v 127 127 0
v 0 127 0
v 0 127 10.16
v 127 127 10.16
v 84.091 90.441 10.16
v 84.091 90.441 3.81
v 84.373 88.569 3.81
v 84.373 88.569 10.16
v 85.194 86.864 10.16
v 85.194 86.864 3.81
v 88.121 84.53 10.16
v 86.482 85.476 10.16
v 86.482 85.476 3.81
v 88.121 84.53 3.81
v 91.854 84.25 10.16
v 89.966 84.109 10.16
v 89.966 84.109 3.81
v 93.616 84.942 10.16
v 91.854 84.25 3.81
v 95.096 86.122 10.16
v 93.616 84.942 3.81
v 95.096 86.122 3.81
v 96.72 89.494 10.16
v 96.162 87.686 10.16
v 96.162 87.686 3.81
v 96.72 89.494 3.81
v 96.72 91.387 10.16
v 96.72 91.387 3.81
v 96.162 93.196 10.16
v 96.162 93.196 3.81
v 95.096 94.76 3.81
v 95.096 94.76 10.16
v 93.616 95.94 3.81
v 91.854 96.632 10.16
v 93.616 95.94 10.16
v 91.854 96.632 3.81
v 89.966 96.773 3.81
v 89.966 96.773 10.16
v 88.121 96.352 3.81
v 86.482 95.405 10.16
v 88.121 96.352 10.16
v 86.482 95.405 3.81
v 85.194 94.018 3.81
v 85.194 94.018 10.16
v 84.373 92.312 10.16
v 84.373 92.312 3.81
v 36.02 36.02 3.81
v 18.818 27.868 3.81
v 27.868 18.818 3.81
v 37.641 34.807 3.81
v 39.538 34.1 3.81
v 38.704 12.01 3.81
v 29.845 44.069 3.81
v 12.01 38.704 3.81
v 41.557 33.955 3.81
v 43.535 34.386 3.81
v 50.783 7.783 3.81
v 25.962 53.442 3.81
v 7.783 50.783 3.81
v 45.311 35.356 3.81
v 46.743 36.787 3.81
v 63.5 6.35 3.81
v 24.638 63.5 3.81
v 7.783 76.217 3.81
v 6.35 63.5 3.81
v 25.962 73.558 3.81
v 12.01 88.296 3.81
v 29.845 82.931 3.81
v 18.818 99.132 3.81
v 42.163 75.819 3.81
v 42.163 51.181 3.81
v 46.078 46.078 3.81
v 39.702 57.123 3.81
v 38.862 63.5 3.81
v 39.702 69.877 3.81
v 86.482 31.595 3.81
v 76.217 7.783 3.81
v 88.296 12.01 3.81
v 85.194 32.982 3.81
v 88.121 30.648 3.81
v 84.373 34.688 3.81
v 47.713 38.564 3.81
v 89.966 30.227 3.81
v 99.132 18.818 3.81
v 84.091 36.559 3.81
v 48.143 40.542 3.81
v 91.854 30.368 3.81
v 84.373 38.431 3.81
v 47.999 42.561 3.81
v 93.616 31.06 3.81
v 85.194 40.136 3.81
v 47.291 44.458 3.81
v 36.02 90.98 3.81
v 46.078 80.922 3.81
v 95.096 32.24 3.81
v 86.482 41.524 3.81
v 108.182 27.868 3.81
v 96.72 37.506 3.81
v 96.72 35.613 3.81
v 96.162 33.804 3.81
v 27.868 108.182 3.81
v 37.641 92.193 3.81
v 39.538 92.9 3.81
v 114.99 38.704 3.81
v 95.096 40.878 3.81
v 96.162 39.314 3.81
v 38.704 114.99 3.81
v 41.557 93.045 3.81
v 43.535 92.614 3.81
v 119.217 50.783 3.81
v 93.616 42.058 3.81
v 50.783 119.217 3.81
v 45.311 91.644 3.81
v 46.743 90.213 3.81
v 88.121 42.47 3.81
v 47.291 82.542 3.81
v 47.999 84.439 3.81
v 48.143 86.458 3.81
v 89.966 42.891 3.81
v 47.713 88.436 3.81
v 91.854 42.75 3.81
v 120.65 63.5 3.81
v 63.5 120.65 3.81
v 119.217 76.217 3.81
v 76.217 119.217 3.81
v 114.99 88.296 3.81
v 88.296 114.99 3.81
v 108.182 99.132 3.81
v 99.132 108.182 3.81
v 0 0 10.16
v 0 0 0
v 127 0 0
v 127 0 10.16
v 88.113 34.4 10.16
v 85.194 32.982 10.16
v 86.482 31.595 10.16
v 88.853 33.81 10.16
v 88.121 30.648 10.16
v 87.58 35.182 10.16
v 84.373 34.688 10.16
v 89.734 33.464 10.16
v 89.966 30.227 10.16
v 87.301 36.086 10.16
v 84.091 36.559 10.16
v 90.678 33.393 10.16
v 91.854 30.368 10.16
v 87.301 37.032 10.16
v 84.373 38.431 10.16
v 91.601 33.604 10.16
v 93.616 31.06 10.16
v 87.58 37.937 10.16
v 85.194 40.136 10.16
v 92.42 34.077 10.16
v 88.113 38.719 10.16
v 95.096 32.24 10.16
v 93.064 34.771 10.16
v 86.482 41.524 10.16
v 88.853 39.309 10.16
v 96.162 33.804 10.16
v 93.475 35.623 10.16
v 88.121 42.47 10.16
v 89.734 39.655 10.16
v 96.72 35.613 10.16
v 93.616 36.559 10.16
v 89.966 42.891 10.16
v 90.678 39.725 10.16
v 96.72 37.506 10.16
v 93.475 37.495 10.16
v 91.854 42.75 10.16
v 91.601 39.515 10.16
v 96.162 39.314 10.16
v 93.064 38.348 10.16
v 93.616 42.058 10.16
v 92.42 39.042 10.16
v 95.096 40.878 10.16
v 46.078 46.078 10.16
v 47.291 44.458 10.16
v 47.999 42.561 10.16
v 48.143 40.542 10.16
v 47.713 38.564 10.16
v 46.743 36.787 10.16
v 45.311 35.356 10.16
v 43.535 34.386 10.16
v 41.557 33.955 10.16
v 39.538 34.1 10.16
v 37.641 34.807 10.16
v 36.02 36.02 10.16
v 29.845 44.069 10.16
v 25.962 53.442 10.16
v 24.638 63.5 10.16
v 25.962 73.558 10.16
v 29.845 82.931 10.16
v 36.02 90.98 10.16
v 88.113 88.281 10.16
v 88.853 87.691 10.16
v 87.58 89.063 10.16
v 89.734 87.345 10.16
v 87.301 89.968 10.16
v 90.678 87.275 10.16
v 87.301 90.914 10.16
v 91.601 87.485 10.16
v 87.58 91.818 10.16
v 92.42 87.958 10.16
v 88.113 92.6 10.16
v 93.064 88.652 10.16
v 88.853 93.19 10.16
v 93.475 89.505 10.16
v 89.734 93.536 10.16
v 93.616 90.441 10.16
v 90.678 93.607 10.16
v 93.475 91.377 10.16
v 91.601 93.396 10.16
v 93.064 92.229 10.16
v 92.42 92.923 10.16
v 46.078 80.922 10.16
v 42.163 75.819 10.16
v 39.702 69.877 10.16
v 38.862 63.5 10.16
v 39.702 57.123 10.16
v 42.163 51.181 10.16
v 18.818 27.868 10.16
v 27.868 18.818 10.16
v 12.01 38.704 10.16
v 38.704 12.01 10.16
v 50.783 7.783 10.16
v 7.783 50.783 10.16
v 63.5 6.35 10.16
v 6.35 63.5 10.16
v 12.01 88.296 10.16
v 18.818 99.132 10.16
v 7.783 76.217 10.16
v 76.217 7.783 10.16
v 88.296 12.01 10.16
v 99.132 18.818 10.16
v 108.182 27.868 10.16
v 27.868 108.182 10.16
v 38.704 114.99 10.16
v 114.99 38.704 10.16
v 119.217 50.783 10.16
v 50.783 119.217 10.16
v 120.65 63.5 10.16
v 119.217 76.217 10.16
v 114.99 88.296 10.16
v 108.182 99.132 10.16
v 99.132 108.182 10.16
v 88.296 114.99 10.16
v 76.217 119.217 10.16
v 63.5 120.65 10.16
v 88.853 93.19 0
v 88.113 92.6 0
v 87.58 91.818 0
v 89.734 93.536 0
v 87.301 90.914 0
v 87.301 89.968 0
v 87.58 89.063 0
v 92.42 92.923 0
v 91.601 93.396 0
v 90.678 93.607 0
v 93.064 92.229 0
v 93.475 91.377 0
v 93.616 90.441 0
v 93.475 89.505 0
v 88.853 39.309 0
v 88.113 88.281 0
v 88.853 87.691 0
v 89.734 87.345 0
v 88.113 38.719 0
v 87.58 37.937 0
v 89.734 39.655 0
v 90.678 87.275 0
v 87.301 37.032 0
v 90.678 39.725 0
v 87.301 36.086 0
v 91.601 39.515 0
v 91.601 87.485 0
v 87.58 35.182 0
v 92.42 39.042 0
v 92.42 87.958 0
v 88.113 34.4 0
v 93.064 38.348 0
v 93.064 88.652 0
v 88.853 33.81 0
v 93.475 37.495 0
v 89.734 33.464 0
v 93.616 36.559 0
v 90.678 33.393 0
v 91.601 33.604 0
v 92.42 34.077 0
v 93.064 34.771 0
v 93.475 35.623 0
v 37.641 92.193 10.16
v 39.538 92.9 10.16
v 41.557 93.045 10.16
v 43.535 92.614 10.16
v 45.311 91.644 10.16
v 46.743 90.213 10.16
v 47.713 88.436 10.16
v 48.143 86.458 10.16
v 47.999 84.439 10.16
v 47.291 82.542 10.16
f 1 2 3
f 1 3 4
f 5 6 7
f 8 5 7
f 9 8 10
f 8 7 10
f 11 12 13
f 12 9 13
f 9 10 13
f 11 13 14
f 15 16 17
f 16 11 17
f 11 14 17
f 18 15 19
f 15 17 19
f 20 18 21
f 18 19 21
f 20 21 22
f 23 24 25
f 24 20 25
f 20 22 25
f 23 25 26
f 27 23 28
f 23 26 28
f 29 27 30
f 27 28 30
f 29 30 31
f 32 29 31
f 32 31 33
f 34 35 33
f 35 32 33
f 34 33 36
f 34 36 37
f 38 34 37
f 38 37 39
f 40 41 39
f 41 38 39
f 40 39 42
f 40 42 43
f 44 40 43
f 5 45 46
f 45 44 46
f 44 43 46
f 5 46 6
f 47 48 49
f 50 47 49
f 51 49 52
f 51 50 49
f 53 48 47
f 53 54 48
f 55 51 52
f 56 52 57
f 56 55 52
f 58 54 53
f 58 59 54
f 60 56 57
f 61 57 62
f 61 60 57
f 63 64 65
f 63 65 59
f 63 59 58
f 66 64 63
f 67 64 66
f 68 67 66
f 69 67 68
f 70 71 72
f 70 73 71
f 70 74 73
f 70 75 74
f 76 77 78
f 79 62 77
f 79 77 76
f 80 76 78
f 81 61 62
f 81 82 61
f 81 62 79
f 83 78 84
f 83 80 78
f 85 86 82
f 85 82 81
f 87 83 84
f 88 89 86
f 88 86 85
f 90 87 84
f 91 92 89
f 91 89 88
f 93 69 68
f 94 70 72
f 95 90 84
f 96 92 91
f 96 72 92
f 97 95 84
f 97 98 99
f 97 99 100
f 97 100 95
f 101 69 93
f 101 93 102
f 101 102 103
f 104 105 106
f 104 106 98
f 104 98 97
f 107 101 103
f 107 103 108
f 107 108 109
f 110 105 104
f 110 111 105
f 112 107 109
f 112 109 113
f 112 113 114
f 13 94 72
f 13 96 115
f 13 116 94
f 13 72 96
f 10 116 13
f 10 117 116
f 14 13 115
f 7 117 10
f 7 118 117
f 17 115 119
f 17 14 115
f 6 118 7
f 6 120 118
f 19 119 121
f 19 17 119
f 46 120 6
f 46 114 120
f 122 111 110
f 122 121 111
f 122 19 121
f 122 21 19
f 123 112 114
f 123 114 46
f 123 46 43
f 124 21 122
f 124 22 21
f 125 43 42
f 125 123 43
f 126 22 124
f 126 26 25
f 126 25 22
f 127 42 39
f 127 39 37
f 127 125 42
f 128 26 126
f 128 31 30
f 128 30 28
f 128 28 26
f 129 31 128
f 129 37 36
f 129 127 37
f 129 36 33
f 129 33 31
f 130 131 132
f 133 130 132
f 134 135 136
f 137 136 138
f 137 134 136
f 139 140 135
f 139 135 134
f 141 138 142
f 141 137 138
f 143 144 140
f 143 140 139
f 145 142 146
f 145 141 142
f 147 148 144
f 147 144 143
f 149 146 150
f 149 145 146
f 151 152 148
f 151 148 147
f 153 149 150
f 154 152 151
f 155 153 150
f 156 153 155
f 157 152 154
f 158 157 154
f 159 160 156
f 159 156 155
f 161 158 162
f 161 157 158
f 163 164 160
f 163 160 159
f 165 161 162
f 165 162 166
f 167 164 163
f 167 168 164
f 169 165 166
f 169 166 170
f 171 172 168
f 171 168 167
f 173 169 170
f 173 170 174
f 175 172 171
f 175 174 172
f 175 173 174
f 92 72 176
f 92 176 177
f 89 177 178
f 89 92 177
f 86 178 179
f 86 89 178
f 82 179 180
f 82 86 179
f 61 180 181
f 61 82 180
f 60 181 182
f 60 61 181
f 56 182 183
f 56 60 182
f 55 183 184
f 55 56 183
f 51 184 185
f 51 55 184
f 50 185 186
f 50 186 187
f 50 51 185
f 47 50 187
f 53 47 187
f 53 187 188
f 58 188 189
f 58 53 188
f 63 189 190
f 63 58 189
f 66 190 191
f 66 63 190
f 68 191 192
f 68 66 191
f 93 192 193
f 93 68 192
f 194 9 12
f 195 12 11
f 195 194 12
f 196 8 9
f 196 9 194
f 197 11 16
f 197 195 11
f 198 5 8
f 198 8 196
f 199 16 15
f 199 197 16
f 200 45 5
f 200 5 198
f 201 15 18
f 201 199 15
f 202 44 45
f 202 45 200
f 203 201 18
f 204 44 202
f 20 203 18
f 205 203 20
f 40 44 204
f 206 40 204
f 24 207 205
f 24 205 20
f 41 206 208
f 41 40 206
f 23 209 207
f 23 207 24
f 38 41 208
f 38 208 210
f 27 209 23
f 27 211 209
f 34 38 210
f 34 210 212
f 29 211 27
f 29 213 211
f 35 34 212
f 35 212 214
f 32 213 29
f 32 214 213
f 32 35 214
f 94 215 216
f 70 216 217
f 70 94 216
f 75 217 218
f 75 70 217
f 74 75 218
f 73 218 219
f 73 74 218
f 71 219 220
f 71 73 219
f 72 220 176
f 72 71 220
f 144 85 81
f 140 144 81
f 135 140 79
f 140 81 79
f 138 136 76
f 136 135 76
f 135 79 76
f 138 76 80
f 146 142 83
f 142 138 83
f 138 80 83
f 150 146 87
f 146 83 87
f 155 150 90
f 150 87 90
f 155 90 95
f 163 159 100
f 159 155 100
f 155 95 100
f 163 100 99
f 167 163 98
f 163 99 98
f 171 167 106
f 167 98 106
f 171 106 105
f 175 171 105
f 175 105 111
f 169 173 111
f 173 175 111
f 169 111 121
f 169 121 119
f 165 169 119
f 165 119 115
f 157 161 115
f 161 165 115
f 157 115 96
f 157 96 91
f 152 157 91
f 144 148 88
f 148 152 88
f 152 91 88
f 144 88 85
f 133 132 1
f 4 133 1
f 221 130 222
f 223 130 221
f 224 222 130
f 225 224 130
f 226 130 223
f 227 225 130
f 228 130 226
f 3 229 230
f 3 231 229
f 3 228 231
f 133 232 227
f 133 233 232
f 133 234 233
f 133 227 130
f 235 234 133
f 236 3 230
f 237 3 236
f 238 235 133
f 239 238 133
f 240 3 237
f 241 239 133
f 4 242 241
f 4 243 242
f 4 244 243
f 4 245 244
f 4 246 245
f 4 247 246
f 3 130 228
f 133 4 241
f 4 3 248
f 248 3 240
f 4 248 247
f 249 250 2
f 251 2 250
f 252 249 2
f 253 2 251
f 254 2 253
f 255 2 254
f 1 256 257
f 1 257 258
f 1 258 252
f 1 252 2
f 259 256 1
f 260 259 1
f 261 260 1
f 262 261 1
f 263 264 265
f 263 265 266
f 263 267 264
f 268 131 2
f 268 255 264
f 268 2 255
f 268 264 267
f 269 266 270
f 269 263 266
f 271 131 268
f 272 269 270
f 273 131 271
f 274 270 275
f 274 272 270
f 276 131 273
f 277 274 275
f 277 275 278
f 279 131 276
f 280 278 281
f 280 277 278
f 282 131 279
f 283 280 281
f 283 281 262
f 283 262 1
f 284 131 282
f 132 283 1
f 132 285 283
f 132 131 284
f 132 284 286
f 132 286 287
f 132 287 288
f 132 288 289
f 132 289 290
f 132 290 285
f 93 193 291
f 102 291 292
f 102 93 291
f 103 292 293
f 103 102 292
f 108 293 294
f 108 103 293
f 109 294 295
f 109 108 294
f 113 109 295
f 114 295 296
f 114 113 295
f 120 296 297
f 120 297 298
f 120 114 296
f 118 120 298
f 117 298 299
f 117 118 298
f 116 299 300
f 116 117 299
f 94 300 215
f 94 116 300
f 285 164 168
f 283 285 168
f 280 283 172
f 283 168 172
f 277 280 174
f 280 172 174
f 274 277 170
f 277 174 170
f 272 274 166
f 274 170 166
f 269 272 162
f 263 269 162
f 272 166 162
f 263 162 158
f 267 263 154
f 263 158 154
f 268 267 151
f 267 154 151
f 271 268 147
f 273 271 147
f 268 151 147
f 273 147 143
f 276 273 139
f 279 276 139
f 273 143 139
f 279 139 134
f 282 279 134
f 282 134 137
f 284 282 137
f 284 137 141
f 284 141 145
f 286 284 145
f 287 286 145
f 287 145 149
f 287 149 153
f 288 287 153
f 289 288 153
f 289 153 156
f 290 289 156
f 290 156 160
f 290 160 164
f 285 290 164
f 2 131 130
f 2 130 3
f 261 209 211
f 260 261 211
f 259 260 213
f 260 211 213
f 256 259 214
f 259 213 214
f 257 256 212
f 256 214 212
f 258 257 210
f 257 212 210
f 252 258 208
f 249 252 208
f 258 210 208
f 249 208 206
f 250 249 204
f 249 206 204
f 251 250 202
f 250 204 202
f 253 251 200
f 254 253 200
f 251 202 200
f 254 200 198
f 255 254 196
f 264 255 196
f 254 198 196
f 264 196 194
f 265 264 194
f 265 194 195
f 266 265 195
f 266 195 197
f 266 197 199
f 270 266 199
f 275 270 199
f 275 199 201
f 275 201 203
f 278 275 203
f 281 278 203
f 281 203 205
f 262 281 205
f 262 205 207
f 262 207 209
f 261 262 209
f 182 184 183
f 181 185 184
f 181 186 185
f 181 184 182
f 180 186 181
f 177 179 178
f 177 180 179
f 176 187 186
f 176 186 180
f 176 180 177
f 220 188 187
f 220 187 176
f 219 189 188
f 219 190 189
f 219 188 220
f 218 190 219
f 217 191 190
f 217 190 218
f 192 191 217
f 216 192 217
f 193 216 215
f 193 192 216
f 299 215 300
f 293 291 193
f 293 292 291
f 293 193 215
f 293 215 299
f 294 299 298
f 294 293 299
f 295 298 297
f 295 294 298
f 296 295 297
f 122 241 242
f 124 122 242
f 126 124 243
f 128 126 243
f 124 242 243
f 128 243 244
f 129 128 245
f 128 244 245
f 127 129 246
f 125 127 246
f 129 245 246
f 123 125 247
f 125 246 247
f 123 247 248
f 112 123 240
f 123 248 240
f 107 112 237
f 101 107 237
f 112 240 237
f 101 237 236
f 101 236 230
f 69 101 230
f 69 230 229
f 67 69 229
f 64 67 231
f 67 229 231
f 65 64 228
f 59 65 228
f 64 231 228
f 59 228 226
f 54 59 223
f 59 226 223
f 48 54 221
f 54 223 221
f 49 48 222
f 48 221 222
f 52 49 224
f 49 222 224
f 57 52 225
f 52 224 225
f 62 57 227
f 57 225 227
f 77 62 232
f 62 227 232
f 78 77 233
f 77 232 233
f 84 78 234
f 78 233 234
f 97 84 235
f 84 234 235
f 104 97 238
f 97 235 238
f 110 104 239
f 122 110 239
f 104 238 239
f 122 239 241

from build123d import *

# Parameters (mm, degrees)
SKETCH1_W                       = 127
SKETCH1_H                       = 127
SKETCH1_R                       = 6.35
BOSS_EXTRUDE1_DEPTH             = 10.16
SKETCH3_R                       = 57.15
CUT_EXTRUDE1_DEPTH              = 6.35
BOSS_EXTRUDE2_REACH             = 181.717
SKETCH4_R                       = 6.35
BOSS_EXTRUDE2_DIRECTION_2_REACH = 181.717
SKETCH5_R                       = 3.175
CUT_EXTRUDE2_DEPTH              = 180.89226109


with BuildPart() as part:
    # Sketch1 → Boss-Extrude1 (new body)
    with BuildSketch(Plane.XY):
        with Locations((63.5, 63.5)):
            Rectangle(SKETCH1_W, SKETCH1_H)
        with Locations((90.440768363, 90.440768363)):
            Circle(SKETCH1_R, mode=Mode.SUBTRACT)
        with Locations((90.440768363, 36.559231637)):
            Circle(SKETCH1_R, mode=Mode.SUBTRACT)
        with BuildLine():
            ThreePointArc((36.020411647, 90.979588353), (24.637993463, 63.5), (36.020411647, 36.020411647))
            ThreePointArc((36.020411647, 36.020411647), (46.078298503, 36.020411647), (46.078298503, 46.078298503))
            ThreePointArc((46.078298503, 46.078298503), (38.861993463, 63.5), (46.078298503, 80.921701497))
            ThreePointArc((46.078298503, 80.921701497), (46.078298503, 90.979588353), (36.020411647, 90.979588353))
        make_face(mode=Mode.SUBTRACT)
    extrude(amount=BOSS_EXTRUDE1_DEPTH)

    # Sketch3 → Cut-Extrude1 (cut)
    with BuildSketch(Plane.XY.offset(10.16)):
        with Locations((63.5, 63.5)):
            Circle(SKETCH3_R)
    extrude(amount=-CUT_EXTRUDE1_DEPTH, mode=Mode.SUBTRACT)

    # Boss-Extrude2: up to this face of the body (flat: up to its plane)
    boss_extrude2_end = Plane(part.part.faces().sort_by_distance((63.5, 1.796051224, 10.16))[0])
    # Sketch4 → Boss-Extrude2 (add, up to the picked face)
    with BuildSketch(Plane.XY.offset(3.81), mode=Mode.PRIVATE) as boss_extrude2_sk1:
        with Locations(Location((90.440768363, 36.559231637, 0), (0, 0, 180))):
            Circle(SKETCH4_R)
    boss_extrude2_tool1 = split(extrude(boss_extrude2_sk1.sketch, amount=BOSS_EXTRUDE2_REACH, mode=Mode.PRIVATE), bisect_by=boss_extrude2_end, keep=Keep.BOTH, mode=Mode.PRIVATE)
    # Sketch4 → Boss-Extrude2 (add, up to the picked face)
    with BuildSketch(Plane.XY.offset(3.81), mode=Mode.PRIVATE) as boss_extrude2_sk2:
        with Locations(Location((90.440768363, 90.440768363, 0), (0, 0, 180))):
            Circle(SKETCH4_R)
    boss_extrude2_tool2 = split(extrude(boss_extrude2_sk2.sketch, amount=BOSS_EXTRUDE2_REACH, mode=Mode.PRIVATE), bisect_by=boss_extrude2_end, keep=Keep.BOTH, mode=Mode.PRIVATE)
    # Sketch4 → Boss-Extrude2 (add, up to the picked face)
    with BuildSketch(Plane.XY.offset(3.81), mode=Mode.PRIVATE) as boss_extrude2_sk3:
        with BuildLine():
            ThreePointArc((46.078298503, 80.921701497), (38.861993463, 63.5), (46.078298503, 46.078298503))
            ThreePointArc((46.078298503, 46.078298503), (46.078298503, 36.020411647), (36.020411647, 36.020411647))
            ThreePointArc((36.020411647, 36.020411647), (24.637993463, 63.5), (36.020411647, 90.979588353))
            ThreePointArc((36.020411647, 90.979588353), (46.078298503, 90.979588353), (46.078298503, 80.921701497))
        make_face()
    boss_extrude2_tool3 = split(extrude(boss_extrude2_sk3.sketch, amount=BOSS_EXTRUDE2_REACH, mode=Mode.PRIVATE), bisect_by=boss_extrude2_end, keep=Keep.BOTH, mode=Mode.PRIVATE)
    add(boss_extrude2_tool1.solids().sort_by(Axis((90.440768, 36.559232, 3.81), (0, 0, 1)))[0])
    add(boss_extrude2_tool2.solids().sort_by(Axis((90.440768, 90.440768, 3.81), (0, 0, 1)))[0])
    add(boss_extrude2_tool3.solids().sort_by(Axis((36.037587, 63.5, 3.81), (0, 0, 1)))[0])

    # Boss-Extrude2 direction 2: up to this face of the body (flat: up to its plane)
    boss_extrude2_direction_2_end = Plane(part.part.faces().sort_by_distance((64.634104548, 63.5, 0))[0])
    # Sketch4 → Boss-Extrude2 direction 2 (add, up to the picked face)
    with BuildSketch(Plane.XY.offset(3.81), mode=Mode.PRIVATE) as boss_extrude2_direction_2_sk1:
        with Locations(Location((90.440768363, 36.559231637, 0), (0, 0, 180))):
            Circle(SKETCH4_R)
    boss_extrude2_direction_2_tool1 = split(extrude(boss_extrude2_direction_2_sk1.sketch, amount=-BOSS_EXTRUDE2_DIRECTION_2_REACH, mode=Mode.PRIVATE), bisect_by=boss_extrude2_direction_2_end, keep=Keep.BOTH, mode=Mode.PRIVATE)
    # Sketch4 → Boss-Extrude2 direction 2 (add, up to the picked face)
    with BuildSketch(Plane.XY.offset(3.81), mode=Mode.PRIVATE) as boss_extrude2_direction_2_sk2:
        with Locations(Location((90.440768363, 90.440768363, 0), (0, 0, 180))):
            Circle(SKETCH4_R)
    boss_extrude2_direction_2_tool2 = split(extrude(boss_extrude2_direction_2_sk2.sketch, amount=-BOSS_EXTRUDE2_DIRECTION_2_REACH, mode=Mode.PRIVATE), bisect_by=boss_extrude2_direction_2_end, keep=Keep.BOTH, mode=Mode.PRIVATE)
    # Sketch4 → Boss-Extrude2 direction 2 (add, up to the picked face)
    with BuildSketch(Plane.XY.offset(3.81), mode=Mode.PRIVATE) as boss_extrude2_direction_2_sk3:
        with BuildLine():
            ThreePointArc((46.078298503, 80.921701497), (38.861993463, 63.5), (46.078298503, 46.078298503))
            ThreePointArc((46.078298503, 46.078298503), (46.078298503, 36.020411647), (36.020411647, 36.020411647))
            ThreePointArc((36.020411647, 36.020411647), (24.637993463, 63.5), (36.020411647, 90.979588353))
            ThreePointArc((36.020411647, 90.979588353), (46.078298503, 90.979588353), (46.078298503, 80.921701497))
        make_face()
    boss_extrude2_direction_2_tool3 = split(extrude(boss_extrude2_direction_2_sk3.sketch, amount=-BOSS_EXTRUDE2_DIRECTION_2_REACH, mode=Mode.PRIVATE), bisect_by=boss_extrude2_direction_2_end, keep=Keep.BOTH, mode=Mode.PRIVATE)
    add(boss_extrude2_direction_2_tool1.solids().sort_by(Axis((90.440768, 36.559232, 3.81), (0, 0, -1)))[0])
    add(boss_extrude2_direction_2_tool2.solids().sort_by(Axis((90.440768, 90.440768, 3.81), (0, 0, -1)))[0])
    add(boss_extrude2_direction_2_tool3.solids().sort_by(Axis((36.037587, 63.5, 3.81), (0, 0, -1)))[0])

    # Sketch5 → Cut-Extrude2 (cut, through all)
    with BuildSketch(Plane.XY.offset(10.16)):
        with Locations((90.440768363, 90.440768363)):
            Circle(SKETCH5_R)
        with Locations((90.440768363, 36.559231637)):
            Circle(SKETCH5_R)
    extrude(amount=-CUT_EXTRUDE2_DEPTH, mode=Mode.SUBTRACT)


solid = part.part
